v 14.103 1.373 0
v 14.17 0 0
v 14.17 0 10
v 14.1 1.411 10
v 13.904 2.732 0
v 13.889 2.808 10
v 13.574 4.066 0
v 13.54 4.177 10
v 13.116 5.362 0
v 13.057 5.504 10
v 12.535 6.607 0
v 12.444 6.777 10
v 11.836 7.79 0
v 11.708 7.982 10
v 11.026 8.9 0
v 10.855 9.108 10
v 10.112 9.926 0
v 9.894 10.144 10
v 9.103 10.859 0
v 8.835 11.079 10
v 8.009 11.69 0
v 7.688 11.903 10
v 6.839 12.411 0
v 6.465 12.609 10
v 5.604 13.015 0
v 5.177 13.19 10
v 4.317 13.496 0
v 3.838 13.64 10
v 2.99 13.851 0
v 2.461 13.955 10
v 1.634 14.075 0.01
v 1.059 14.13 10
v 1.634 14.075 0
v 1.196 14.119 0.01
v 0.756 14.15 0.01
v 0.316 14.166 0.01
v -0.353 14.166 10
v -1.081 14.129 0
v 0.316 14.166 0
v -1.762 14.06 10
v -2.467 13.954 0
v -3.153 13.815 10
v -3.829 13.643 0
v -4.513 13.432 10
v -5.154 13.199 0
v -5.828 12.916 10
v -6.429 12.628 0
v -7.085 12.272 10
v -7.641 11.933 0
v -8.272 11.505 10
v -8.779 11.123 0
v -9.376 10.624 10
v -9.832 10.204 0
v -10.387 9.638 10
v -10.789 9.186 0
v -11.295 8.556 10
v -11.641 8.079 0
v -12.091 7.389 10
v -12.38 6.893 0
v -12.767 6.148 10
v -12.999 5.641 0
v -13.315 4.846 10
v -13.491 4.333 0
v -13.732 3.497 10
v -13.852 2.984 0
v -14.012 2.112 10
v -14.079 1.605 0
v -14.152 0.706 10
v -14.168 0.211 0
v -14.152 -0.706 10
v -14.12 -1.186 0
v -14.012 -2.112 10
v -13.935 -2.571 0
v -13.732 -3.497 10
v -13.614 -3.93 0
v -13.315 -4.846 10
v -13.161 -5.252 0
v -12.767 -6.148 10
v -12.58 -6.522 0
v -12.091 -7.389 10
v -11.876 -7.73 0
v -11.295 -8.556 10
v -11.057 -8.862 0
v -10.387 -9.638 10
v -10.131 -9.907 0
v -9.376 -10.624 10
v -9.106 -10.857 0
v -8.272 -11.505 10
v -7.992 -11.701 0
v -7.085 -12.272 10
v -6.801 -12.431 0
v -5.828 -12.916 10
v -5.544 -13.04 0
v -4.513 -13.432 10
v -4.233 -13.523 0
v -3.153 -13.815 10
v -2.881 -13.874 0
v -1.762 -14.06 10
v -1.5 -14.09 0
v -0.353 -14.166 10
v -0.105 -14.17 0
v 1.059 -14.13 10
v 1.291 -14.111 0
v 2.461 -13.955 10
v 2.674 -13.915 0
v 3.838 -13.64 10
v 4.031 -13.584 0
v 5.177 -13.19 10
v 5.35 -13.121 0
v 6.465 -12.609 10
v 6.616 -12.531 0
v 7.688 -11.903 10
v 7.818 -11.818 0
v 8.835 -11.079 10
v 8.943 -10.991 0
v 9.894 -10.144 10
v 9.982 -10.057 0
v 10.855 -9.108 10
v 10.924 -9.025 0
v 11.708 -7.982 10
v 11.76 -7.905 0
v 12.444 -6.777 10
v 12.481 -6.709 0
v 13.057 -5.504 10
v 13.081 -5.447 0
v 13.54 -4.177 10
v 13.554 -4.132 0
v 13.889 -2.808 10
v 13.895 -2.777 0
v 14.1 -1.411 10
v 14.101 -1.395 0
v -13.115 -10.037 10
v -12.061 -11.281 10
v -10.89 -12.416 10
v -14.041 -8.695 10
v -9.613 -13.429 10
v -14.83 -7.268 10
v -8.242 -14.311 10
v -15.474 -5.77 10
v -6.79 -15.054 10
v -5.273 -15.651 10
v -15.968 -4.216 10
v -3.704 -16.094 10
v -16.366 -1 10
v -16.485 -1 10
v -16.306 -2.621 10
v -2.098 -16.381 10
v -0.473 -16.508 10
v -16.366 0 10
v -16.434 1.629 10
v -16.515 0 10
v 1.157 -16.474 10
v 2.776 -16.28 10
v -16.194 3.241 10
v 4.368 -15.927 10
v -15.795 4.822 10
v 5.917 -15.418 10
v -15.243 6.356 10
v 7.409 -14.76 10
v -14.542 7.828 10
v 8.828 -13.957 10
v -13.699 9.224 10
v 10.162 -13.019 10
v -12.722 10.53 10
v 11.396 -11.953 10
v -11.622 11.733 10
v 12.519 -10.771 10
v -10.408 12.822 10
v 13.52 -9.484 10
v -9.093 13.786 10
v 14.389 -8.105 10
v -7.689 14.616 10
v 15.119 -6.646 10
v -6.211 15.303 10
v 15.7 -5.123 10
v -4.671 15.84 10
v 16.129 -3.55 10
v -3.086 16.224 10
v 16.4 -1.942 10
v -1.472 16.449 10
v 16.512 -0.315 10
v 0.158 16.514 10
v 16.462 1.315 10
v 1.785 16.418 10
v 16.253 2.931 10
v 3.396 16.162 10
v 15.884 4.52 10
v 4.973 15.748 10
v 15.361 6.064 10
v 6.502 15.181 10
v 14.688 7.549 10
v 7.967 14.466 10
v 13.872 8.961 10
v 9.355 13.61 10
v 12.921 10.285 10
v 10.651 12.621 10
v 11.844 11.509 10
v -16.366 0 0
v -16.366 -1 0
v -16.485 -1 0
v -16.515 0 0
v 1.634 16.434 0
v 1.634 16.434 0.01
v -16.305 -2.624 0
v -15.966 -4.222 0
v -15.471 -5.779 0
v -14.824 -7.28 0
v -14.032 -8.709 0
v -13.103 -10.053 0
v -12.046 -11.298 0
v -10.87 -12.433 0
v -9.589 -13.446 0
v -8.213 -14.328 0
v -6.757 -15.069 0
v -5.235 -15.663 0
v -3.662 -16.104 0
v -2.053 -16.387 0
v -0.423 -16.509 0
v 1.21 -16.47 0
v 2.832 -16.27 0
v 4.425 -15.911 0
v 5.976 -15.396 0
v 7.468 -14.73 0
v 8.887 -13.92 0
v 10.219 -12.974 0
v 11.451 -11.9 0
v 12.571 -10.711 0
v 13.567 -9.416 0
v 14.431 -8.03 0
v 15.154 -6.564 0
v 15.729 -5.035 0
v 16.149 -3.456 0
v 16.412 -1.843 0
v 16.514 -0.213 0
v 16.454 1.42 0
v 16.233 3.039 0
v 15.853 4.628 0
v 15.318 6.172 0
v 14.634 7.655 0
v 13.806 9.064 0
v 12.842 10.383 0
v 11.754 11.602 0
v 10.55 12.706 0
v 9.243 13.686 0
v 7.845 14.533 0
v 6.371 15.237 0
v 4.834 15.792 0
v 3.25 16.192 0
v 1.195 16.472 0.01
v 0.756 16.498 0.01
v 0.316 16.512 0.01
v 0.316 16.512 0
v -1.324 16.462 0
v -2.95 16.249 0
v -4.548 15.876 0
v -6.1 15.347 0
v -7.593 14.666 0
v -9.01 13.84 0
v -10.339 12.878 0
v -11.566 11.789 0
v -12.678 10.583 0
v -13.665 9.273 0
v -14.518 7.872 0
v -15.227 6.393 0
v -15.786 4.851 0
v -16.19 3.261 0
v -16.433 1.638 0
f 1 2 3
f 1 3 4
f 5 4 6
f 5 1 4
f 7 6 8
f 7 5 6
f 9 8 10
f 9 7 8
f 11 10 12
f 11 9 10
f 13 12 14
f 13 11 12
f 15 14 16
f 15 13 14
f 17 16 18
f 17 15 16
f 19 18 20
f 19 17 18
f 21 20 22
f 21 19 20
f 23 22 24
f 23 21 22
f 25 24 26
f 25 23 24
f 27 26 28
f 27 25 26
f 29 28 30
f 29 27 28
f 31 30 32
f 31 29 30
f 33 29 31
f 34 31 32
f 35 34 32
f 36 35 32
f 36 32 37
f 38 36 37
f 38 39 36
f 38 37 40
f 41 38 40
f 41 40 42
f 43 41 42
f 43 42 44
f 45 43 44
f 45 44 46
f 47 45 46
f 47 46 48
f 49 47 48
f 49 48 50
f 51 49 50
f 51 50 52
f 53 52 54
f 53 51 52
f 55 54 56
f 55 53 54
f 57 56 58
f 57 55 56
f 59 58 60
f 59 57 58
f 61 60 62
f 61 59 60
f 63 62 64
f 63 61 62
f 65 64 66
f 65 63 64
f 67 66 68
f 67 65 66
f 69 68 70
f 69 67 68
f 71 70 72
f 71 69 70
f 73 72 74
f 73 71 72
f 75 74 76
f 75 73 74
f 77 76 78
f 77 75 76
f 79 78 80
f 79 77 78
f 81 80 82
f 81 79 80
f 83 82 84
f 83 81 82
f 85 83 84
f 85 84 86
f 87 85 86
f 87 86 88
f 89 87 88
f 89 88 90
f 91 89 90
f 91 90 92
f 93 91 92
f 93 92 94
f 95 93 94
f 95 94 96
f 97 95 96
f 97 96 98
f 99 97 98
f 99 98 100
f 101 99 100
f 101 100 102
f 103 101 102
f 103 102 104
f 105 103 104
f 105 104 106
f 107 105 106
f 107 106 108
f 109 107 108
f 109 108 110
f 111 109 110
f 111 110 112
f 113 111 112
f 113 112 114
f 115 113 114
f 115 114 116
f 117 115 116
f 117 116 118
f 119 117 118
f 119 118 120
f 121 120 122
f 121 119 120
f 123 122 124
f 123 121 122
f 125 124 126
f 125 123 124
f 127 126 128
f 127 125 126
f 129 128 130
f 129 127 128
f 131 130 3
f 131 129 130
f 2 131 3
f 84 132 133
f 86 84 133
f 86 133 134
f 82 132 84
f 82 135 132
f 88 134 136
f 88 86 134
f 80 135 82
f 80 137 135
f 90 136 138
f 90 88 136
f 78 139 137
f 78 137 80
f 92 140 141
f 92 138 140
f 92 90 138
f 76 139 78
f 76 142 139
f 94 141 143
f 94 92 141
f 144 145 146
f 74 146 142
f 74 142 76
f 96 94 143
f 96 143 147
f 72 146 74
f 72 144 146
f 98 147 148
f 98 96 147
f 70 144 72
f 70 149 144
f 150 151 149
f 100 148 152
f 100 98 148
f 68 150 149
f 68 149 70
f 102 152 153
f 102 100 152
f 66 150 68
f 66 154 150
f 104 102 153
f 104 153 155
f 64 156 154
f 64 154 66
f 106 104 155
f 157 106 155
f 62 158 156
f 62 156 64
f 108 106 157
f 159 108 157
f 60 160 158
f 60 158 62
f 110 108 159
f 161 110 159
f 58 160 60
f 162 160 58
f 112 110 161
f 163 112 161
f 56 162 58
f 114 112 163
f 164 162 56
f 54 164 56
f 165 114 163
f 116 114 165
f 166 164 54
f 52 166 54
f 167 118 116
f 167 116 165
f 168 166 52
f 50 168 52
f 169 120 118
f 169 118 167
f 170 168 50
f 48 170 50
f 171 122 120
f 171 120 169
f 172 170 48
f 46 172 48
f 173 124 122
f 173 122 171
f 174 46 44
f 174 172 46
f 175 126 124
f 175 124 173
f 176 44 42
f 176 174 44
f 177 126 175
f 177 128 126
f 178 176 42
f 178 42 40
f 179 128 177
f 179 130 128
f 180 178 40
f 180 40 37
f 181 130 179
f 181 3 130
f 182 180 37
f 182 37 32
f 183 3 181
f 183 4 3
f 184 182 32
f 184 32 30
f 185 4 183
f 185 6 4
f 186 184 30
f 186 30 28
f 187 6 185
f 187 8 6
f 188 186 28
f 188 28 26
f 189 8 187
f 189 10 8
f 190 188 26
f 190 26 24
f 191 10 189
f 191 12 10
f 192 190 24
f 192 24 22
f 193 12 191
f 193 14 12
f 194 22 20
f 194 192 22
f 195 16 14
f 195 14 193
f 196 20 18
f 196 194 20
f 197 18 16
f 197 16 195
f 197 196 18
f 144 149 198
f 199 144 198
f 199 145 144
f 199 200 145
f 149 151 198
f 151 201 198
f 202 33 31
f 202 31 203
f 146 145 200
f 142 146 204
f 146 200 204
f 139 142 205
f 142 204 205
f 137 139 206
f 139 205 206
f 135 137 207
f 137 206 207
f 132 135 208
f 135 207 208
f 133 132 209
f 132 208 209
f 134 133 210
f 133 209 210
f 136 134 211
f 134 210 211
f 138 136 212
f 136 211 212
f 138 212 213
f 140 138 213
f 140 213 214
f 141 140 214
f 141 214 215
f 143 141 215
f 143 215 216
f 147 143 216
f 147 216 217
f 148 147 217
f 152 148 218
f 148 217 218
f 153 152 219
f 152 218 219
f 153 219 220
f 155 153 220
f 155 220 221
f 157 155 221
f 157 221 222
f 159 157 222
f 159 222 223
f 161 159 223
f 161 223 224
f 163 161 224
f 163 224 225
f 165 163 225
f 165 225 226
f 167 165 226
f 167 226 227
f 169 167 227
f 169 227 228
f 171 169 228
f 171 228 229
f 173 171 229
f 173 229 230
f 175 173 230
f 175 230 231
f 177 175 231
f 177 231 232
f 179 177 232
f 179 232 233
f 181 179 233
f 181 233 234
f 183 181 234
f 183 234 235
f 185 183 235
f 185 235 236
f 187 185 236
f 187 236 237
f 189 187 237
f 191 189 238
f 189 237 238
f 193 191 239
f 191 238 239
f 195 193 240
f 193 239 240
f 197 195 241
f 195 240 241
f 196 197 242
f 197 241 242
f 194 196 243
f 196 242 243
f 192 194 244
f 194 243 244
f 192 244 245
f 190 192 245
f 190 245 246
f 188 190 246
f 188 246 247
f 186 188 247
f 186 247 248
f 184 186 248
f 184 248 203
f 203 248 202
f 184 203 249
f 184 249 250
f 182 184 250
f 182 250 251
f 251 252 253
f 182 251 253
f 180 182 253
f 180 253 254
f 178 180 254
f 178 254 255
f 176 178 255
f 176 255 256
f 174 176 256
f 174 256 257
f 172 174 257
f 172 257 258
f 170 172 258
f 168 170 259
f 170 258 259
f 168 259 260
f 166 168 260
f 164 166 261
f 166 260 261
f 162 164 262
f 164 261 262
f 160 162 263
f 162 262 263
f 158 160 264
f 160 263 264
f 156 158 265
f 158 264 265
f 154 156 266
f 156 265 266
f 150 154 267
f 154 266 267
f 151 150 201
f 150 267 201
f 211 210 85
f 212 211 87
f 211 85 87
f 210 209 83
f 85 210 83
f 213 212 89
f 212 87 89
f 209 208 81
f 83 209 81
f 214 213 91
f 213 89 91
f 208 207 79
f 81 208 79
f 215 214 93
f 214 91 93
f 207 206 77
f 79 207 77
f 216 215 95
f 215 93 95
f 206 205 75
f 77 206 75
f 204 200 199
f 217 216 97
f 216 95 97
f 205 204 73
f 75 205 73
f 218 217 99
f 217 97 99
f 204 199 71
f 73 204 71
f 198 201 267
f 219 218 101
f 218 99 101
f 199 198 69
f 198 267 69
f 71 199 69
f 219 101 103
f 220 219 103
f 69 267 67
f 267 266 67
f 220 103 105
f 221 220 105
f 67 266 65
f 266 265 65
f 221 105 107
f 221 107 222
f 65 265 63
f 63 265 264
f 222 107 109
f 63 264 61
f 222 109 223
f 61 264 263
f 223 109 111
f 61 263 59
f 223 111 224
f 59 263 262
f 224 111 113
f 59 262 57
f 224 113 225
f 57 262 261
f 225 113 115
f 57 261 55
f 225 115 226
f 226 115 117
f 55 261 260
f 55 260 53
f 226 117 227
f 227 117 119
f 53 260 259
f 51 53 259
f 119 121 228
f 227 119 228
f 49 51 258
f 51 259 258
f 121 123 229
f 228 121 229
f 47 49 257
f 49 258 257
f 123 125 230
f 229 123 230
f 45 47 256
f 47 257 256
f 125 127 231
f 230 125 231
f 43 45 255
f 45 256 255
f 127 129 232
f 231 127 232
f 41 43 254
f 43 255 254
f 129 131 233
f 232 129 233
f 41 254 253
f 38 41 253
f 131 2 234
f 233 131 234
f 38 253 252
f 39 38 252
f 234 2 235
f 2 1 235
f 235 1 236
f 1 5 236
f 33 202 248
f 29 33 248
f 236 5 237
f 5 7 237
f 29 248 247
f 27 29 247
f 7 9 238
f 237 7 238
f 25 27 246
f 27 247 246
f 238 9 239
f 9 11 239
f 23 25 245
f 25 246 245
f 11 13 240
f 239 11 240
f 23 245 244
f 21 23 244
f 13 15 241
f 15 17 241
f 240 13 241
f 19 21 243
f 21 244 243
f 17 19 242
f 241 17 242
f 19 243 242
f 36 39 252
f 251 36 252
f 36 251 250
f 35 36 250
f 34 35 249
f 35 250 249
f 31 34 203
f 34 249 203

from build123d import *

# Parameters (mm, degrees)
SKETCH1_R           = 16.514885265
SKETCH1_R_2         = 14.17
BOSS_EXTRUDE1_DEPTH = 10
SKETCH2_W           = 1.74827772
SKETCH2_H           = 14.423291192
CUT_EXTRUDE1_DEPTH  = 1
SKETCH3_W           = 1.31818545
SKETCH3_H           = 5.3419597
CUT_EXTRUDE2_DEPTH  = 0.01


with BuildPart() as part:
    # Sketch1 → Boss-Extrude1 (new body)
    with BuildSketch(Plane.XY):
        Circle(SKETCH1_R)
        Circle(SKETCH1_R_2, mode=Mode.SUBTRACT)
    extrude(amount=BOSS_EXTRUDE1_DEPTH)

    # Sketch2 → Cut-Extrude1 (cut)
    with BuildSketch(Plane(origin=(0, 0, 0), x_dir=(1, 0, 0), z_dir=(0, 1, 0))):
        with Locations((-17.239960851, -5.63132251)):
            Rectangle(SKETCH2_W, SKETCH2_H)
    extrude(amount=-CUT_EXTRUDE1_DEPTH, mode=Mode.SUBTRACT)

    # Sketch3 → Cut-Extrude2 (cut)
    with BuildSketch(Plane.XY):
        with Locations((0.974918477, 15.020333746)):
            Rectangle(SKETCH3_W, SKETCH3_H)
    extrude(amount=CUT_EXTRUDE2_DEPTH, mode=Mode.SUBTRACT)


solid = part.part
